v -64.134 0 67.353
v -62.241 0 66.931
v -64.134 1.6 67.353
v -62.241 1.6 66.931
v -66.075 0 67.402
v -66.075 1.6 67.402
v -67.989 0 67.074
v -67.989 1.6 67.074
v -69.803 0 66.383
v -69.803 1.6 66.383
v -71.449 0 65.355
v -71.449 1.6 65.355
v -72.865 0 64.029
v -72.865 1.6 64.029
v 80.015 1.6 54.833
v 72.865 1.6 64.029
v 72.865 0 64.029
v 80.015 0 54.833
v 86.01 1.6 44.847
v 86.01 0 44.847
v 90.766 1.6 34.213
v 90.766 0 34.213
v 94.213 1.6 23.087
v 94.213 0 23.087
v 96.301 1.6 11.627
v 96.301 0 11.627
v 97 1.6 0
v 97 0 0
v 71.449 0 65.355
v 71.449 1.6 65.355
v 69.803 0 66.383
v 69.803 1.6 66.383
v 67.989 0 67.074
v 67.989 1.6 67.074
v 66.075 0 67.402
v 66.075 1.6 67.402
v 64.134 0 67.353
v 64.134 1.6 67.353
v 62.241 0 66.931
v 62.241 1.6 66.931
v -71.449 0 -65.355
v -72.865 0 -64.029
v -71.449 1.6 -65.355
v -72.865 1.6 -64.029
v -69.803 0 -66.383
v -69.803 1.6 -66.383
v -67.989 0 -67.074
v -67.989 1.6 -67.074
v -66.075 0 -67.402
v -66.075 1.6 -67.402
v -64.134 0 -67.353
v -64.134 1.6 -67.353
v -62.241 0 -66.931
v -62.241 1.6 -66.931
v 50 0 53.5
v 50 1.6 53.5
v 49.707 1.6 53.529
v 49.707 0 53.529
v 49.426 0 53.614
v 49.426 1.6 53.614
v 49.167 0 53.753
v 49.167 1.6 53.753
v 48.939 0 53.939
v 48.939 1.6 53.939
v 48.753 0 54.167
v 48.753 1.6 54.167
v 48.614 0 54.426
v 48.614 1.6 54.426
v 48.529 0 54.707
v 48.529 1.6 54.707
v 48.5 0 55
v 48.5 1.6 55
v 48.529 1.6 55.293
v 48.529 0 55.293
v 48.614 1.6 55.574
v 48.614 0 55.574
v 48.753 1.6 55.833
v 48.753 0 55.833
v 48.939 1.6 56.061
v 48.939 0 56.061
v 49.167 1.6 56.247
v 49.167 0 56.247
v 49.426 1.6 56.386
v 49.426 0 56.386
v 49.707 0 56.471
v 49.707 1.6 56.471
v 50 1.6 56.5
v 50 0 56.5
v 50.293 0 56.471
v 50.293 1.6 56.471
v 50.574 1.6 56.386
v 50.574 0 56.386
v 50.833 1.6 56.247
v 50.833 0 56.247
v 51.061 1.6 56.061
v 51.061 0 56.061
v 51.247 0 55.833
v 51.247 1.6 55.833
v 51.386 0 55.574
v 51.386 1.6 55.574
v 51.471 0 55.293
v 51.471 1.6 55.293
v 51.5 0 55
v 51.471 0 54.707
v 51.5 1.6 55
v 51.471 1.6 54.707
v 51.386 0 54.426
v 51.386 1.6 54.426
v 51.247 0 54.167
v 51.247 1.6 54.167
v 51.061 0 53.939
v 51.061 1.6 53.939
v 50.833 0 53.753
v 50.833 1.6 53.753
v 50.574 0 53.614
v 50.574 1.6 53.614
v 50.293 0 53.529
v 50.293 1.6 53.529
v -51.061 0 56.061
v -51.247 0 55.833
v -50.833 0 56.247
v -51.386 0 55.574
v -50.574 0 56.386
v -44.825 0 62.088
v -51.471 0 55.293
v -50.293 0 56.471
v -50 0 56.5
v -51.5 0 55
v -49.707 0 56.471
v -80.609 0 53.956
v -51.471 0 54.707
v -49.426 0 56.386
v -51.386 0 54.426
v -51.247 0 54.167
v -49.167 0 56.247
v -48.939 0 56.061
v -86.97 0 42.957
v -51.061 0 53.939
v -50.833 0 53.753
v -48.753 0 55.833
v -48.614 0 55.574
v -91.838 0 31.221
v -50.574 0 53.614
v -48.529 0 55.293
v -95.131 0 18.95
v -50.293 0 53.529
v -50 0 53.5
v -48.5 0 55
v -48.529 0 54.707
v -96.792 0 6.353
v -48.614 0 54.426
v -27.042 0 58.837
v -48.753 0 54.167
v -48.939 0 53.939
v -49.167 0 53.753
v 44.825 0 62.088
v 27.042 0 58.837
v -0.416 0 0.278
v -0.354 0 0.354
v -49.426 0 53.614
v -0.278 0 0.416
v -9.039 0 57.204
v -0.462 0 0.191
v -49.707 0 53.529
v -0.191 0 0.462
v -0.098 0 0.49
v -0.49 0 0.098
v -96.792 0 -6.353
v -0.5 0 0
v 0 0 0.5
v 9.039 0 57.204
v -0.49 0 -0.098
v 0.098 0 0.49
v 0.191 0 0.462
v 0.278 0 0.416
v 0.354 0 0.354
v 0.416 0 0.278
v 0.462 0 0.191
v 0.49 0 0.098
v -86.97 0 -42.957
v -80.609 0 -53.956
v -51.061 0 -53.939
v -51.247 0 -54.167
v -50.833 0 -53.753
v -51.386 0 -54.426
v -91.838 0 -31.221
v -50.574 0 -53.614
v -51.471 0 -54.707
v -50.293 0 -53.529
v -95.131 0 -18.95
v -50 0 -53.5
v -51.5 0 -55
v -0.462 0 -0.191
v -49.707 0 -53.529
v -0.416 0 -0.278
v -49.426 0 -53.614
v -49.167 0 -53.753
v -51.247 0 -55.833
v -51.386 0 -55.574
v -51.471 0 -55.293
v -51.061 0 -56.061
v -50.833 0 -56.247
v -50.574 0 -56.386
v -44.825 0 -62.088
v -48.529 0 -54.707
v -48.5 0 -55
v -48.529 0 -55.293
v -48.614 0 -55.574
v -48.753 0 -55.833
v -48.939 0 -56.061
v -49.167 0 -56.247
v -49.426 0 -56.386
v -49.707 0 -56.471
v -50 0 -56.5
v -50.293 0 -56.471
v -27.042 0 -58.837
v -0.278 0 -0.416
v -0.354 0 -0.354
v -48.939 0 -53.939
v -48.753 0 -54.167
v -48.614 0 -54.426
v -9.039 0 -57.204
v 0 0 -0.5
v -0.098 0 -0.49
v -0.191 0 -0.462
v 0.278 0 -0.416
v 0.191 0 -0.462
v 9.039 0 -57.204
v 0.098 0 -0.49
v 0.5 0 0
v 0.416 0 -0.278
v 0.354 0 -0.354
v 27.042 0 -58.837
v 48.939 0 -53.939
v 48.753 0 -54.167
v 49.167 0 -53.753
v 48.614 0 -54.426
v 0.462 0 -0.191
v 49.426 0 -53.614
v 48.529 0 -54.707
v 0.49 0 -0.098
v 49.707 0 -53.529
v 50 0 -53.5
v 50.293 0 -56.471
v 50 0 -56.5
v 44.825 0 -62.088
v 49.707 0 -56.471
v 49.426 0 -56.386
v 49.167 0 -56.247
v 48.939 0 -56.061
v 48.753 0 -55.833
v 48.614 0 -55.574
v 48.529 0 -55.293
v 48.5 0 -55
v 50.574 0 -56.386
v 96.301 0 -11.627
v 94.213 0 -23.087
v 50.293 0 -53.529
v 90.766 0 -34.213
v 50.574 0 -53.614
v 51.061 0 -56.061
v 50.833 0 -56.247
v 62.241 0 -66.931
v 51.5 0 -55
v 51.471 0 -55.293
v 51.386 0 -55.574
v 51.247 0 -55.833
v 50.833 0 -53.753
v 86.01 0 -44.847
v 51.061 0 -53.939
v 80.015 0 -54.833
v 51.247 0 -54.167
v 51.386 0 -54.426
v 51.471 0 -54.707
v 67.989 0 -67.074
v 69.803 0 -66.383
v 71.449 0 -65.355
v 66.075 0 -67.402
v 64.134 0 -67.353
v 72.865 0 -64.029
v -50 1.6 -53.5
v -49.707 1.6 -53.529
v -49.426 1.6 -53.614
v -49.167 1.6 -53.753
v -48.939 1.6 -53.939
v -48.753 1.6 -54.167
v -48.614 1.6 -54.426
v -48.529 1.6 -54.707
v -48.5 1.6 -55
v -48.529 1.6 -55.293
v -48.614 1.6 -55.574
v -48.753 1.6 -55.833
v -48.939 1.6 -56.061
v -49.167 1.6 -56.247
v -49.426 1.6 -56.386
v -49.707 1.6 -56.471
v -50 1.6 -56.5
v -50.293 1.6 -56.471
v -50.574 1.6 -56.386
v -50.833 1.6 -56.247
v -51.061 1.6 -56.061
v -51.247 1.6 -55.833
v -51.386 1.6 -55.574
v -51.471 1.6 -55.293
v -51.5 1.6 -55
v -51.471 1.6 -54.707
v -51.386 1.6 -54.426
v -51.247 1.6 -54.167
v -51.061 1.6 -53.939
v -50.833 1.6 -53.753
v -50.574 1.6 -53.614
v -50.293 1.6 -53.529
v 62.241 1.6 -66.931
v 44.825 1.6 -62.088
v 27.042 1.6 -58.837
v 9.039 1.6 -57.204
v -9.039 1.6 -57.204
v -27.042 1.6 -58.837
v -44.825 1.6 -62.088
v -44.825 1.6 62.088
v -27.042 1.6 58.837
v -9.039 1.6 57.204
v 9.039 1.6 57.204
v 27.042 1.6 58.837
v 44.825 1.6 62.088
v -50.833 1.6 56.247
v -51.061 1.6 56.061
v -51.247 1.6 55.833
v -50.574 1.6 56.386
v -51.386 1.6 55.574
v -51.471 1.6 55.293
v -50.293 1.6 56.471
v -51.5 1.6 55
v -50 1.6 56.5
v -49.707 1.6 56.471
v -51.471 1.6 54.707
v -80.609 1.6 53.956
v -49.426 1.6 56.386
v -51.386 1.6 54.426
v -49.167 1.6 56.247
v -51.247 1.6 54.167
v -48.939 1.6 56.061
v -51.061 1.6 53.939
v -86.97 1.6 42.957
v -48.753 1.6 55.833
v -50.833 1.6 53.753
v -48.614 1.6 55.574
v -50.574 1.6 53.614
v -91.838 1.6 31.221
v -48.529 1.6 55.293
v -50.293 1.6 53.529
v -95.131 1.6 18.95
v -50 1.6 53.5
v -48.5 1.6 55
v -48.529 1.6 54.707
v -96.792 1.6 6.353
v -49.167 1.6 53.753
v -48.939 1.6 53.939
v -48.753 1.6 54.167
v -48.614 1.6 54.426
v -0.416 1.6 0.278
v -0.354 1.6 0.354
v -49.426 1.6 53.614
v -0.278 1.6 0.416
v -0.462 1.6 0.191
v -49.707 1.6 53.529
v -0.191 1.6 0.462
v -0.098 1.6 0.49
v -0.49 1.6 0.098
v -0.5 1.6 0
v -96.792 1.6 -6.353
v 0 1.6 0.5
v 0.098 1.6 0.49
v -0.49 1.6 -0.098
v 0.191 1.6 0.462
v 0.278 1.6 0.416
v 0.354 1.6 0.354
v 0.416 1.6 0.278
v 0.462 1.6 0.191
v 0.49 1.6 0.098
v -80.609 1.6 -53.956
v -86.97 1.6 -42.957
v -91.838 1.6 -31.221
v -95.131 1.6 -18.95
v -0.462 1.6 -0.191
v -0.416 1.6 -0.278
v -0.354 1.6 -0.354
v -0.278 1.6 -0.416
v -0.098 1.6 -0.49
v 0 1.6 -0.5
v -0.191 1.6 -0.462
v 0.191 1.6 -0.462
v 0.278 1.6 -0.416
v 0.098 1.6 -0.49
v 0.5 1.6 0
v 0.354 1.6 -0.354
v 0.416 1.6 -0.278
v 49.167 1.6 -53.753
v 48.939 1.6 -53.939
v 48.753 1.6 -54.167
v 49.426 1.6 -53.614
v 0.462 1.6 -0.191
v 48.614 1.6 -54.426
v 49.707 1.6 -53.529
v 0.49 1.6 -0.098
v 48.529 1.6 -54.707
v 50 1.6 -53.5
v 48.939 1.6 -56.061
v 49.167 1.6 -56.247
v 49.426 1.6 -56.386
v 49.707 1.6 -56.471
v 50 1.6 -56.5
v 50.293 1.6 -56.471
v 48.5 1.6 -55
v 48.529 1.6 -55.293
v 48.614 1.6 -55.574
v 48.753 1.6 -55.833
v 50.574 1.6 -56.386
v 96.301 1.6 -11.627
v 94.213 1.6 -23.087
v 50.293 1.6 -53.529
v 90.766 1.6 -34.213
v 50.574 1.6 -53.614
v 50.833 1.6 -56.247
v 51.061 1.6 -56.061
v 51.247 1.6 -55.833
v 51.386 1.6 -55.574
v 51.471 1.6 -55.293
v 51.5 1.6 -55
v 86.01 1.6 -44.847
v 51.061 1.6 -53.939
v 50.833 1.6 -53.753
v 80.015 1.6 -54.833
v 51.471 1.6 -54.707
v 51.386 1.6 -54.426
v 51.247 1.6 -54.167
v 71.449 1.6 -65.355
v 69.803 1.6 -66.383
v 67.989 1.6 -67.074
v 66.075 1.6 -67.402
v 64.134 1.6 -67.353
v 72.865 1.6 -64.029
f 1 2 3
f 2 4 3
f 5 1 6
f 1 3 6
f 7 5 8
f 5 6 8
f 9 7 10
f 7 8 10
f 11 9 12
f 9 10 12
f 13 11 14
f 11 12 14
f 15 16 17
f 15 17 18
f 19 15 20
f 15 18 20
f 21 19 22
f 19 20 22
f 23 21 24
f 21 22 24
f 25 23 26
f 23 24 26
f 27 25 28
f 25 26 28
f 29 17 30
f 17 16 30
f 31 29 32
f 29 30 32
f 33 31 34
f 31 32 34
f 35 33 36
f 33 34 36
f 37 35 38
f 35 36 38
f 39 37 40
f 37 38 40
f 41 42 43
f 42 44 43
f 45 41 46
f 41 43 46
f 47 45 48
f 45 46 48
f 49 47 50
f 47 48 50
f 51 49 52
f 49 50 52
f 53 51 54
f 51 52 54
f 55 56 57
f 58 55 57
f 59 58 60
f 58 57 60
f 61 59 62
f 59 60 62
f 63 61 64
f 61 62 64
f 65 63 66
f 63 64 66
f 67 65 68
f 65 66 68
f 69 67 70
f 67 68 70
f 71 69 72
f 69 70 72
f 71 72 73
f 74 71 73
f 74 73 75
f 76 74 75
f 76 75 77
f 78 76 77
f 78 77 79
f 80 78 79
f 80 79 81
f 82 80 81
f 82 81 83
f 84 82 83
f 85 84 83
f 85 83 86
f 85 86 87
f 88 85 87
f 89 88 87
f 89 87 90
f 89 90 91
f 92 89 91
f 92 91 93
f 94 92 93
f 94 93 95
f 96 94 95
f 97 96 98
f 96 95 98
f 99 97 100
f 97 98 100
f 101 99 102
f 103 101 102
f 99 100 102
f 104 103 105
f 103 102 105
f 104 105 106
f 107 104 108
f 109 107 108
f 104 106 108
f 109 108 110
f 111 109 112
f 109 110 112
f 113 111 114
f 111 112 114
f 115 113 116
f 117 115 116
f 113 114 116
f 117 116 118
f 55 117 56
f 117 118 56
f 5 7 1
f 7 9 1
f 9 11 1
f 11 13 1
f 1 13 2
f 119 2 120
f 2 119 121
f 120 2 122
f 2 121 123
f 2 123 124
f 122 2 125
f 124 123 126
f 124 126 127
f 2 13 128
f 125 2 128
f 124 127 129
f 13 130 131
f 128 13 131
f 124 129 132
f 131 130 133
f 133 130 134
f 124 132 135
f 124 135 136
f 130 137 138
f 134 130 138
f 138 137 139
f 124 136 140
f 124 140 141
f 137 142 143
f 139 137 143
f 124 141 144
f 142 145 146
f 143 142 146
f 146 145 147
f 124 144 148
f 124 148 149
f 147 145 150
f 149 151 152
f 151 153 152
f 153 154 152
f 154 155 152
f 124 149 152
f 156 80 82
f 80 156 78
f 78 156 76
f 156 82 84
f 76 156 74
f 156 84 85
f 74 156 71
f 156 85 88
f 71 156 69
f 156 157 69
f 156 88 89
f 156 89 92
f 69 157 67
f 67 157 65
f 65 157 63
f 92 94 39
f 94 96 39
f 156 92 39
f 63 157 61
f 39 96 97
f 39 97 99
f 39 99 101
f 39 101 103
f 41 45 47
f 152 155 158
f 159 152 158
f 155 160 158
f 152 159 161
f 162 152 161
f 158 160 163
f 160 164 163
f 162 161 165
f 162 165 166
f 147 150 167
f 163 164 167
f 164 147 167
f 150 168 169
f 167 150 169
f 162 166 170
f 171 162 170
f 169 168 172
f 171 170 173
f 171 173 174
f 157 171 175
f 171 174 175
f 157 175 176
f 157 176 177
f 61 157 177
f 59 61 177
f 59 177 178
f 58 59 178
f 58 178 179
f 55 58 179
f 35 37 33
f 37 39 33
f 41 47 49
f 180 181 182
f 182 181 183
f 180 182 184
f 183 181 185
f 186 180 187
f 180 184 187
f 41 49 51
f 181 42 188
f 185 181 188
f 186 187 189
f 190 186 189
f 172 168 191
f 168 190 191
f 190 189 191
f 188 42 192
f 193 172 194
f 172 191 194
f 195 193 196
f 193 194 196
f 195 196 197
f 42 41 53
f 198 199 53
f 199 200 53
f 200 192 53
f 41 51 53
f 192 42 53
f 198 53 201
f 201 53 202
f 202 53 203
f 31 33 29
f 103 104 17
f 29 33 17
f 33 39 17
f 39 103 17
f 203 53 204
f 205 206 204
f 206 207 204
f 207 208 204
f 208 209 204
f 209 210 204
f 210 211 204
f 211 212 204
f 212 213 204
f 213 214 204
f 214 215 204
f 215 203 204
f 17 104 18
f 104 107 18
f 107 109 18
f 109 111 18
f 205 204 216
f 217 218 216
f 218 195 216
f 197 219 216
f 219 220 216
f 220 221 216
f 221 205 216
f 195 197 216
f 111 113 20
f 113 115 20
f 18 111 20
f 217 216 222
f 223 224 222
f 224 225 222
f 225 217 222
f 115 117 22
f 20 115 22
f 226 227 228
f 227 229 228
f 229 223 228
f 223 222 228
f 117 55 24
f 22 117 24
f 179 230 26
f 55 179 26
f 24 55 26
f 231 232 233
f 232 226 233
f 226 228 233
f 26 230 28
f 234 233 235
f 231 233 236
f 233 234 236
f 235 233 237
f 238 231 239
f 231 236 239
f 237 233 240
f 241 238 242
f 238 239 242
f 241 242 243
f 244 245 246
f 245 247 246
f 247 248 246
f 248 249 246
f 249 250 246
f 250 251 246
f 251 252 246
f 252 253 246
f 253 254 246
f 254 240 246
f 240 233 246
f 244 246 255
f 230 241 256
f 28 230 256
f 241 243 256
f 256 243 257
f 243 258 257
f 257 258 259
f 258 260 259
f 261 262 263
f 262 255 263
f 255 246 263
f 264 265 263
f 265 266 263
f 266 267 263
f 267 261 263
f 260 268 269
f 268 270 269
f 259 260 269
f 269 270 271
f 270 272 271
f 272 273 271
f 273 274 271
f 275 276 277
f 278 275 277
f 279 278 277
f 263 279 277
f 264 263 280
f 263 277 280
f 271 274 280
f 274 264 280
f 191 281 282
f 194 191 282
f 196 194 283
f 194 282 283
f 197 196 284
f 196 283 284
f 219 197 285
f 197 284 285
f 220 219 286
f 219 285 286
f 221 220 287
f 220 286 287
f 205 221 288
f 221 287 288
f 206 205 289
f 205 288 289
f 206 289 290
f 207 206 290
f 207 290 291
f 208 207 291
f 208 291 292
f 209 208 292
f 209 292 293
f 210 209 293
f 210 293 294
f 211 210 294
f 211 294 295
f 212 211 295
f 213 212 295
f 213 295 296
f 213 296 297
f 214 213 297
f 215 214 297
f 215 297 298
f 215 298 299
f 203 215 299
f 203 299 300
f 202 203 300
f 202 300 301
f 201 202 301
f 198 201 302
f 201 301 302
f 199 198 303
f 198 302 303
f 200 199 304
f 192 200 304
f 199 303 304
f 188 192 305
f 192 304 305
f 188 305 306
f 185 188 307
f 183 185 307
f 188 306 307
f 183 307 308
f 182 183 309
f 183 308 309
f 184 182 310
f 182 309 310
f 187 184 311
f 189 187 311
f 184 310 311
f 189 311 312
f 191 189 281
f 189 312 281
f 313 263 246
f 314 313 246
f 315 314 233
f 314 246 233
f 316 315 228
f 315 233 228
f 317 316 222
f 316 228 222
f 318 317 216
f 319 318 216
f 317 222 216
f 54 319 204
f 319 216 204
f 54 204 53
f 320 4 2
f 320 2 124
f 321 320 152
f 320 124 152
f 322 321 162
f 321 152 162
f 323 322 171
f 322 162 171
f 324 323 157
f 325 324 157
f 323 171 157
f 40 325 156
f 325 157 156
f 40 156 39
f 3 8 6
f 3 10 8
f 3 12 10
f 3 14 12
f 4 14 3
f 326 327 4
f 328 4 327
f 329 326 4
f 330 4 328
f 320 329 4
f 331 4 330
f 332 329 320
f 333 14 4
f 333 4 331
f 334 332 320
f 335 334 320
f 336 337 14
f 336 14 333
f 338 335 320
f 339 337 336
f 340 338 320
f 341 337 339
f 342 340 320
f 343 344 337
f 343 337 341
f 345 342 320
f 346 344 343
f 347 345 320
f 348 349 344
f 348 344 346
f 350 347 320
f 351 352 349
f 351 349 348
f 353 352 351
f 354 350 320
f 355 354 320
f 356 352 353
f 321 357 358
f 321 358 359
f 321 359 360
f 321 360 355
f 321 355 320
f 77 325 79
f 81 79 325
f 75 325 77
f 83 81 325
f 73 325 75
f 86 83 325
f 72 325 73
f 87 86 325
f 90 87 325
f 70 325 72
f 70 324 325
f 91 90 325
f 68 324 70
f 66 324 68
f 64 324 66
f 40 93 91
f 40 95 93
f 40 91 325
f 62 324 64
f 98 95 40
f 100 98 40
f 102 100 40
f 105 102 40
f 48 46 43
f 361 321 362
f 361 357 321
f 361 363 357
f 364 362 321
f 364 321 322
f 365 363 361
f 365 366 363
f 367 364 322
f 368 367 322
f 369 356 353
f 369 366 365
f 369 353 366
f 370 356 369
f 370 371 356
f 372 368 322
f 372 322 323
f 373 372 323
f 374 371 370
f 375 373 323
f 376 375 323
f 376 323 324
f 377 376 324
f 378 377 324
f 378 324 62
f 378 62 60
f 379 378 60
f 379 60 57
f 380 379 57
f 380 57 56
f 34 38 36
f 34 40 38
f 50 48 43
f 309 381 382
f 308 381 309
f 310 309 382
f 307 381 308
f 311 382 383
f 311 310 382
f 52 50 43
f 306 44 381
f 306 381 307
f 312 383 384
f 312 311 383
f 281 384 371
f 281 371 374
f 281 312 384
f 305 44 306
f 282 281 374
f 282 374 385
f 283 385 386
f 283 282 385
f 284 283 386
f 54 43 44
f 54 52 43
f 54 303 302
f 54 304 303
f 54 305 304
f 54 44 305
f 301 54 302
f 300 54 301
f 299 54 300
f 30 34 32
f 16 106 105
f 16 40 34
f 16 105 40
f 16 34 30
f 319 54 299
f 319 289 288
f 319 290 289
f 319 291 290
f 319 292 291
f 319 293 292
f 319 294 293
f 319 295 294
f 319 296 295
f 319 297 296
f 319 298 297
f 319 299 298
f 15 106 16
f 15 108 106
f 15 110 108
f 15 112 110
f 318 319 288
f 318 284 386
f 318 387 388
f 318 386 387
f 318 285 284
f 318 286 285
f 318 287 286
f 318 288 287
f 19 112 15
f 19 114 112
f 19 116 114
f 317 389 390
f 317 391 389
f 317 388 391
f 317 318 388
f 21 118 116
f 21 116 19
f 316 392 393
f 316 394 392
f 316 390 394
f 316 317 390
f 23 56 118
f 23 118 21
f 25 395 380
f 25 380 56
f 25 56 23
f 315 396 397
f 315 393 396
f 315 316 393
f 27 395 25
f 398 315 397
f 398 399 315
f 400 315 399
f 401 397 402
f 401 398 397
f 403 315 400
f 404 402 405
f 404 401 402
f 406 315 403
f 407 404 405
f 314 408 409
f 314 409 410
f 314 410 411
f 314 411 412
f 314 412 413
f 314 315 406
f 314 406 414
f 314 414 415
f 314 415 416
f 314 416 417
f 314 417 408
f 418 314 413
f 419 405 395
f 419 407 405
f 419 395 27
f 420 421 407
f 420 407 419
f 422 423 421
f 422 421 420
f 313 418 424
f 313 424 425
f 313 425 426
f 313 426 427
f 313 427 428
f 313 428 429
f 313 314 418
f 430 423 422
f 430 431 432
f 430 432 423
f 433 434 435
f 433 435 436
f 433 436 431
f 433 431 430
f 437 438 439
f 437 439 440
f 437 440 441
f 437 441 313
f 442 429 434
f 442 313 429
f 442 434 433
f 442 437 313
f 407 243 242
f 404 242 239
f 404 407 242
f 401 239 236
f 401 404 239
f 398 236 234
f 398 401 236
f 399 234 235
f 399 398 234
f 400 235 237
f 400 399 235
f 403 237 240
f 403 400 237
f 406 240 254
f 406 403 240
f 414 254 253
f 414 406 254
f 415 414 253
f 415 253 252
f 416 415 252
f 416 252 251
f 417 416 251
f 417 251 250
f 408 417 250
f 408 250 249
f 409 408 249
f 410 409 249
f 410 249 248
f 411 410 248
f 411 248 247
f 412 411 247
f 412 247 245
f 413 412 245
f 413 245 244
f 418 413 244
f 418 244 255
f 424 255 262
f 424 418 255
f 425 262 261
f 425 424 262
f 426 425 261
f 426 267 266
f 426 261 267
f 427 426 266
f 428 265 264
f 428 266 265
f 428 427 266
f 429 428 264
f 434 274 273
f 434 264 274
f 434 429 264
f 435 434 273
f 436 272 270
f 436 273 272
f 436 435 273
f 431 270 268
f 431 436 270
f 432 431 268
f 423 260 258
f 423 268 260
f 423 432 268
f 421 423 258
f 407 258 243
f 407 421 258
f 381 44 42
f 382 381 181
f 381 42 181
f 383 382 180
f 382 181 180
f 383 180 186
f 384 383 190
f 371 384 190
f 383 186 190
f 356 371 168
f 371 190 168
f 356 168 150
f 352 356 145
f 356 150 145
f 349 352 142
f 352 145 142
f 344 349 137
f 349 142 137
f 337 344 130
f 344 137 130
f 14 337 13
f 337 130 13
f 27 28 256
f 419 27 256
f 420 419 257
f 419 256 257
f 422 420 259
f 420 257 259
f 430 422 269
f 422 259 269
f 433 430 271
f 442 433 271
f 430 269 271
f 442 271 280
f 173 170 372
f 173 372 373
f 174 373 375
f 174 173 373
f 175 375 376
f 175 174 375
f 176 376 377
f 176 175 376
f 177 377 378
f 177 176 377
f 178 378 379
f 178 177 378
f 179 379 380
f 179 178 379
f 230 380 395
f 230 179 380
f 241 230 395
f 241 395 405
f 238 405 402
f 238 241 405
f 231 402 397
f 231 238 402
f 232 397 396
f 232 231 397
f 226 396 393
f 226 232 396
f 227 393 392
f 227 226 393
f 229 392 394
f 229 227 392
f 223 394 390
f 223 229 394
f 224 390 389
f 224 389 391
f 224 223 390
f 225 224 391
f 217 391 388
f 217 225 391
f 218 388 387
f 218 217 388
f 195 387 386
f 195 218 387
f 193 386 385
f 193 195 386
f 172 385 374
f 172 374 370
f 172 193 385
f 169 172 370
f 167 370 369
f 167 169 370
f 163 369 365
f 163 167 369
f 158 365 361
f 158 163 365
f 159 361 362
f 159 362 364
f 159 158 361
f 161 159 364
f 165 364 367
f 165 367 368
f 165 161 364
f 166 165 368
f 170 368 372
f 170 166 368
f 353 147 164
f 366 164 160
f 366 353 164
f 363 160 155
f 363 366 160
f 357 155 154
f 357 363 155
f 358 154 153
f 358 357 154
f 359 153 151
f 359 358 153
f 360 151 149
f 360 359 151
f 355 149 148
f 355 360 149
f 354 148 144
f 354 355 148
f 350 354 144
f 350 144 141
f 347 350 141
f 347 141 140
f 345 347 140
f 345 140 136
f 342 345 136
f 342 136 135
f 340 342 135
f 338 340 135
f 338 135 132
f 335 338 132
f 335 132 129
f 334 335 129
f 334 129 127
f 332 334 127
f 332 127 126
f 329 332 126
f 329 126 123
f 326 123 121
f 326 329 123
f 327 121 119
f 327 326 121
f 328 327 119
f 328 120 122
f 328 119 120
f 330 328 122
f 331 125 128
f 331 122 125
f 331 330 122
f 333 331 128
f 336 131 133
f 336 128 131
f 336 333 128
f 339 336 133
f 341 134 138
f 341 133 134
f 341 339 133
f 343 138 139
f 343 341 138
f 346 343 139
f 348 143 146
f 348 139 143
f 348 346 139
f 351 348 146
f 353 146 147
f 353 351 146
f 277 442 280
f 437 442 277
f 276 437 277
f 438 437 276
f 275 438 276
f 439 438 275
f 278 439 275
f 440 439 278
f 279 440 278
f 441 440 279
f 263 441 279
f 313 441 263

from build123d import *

# Parameters (mm, degrees)
ESBO_O1_R                 = 0.5
RESSALTO_EXTRUS_O1_DEPTH  = 1.6
FILETE1_R                 = 10
ESBO_O2_R                 = 1.5
CORTE_EXTRUS_O1_DEPTH     = 119.14439181
ESPELHAR2_COPY_1_SKETCH_R = 1.5
ESPELHAR2_COPY_1_DEPTH    = 119.14439181


with BuildPart() as part:
    # Esboço1 → Ressalto-extrusão1 (new body)
    with BuildSketch(Plane(origin=(0, 0, 0), x_dir=(1, 0, 0), z_dir=(0, 1, 0))):
        with BuildLine():
            ThreePointArc((68.191990862, -68.984435798), (89.508723356, -37.378983978), (97, 0))
            ThreePointArc((97, 0), (89.508723356, 37.378983978), (68.191990862, 68.984435798))
            ThreePointArc((68.191990862, 68.984435798), (0, 57), (-68.191990862, 68.984435798))
            ThreePointArc((-68.191990862, 68.984435798), (-97, 0), (-68.191990862, -68.984435798))
            ThreePointArc((-68.191990862, -68.984435798), (0, -57), (68.191990862, -68.984435798))
        make_face()
        with Locations(Location((0, 0, 0), (0, 0, 270))):
            Circle(ESBO_O1_R, mode=Mode.SUBTRACT)
    extrude(amount=RESSALTO_EXTRUS_O1_DEPTH)

    # Filete1
    filete1_edges = [part.edges().sort_by_distance(p)[0] for p in [
        (-68.191990862, 0.8, -68.984435798),
        (68.191990862, 0.8, -68.984435798),
        (68.191990862, 0.8, 68.984435798),
        (-68.191990862, 0.8, 68.984435798),
    ]]
    fillet(filete1_edges, radius=FILETE1_R)

    # Esboço2 → Corte-extrusão1 (cut, through all)
    with BuildSketch(Plane(origin=(0, 1.6, 0), x_dir=(1, 0, 0), z_dir=(0, 1, 0))):
        with Locations(Location((-50, 55, 0), (0, 0, 270))):
            Circle(ESBO_O2_R)
    corte_extrus_o1 = extrude(amount=-CORTE_EXTRUS_O1_DEPTH, mode=Mode.SUBTRACT)

    # Espelhar1: Corte-extrusão1 across plane
    add(corte_extrus_o1.mirror(Plane(origin=(0, 0, 0), x_dir=(0, 0, 1), z_dir=(1, 0, 0))), mode=Mode.SUBTRACT)

    # Espelhar2: Corte-extrusão1 across plane
    add(corte_extrus_o1.mirror(Plane.XY), mode=Mode.SUBTRACT)

    # Espelhar2 copy 1 sketch → Espelhar2 copy 1 (cut, through all)
    with BuildSketch(Plane(origin=(0, 1.6, 0), x_dir=(-1, 0, 0), z_dir=(0, 1, 0))):
        with Locations(Location((-50, 55, 0), (0, 0, 270))):
            Circle(ESPELHAR2_COPY_1_SKETCH_R)
    extrude(amount=-ESPELHAR2_COPY_1_DEPTH, mode=Mode.SUBTRACT)


solid = part.part
